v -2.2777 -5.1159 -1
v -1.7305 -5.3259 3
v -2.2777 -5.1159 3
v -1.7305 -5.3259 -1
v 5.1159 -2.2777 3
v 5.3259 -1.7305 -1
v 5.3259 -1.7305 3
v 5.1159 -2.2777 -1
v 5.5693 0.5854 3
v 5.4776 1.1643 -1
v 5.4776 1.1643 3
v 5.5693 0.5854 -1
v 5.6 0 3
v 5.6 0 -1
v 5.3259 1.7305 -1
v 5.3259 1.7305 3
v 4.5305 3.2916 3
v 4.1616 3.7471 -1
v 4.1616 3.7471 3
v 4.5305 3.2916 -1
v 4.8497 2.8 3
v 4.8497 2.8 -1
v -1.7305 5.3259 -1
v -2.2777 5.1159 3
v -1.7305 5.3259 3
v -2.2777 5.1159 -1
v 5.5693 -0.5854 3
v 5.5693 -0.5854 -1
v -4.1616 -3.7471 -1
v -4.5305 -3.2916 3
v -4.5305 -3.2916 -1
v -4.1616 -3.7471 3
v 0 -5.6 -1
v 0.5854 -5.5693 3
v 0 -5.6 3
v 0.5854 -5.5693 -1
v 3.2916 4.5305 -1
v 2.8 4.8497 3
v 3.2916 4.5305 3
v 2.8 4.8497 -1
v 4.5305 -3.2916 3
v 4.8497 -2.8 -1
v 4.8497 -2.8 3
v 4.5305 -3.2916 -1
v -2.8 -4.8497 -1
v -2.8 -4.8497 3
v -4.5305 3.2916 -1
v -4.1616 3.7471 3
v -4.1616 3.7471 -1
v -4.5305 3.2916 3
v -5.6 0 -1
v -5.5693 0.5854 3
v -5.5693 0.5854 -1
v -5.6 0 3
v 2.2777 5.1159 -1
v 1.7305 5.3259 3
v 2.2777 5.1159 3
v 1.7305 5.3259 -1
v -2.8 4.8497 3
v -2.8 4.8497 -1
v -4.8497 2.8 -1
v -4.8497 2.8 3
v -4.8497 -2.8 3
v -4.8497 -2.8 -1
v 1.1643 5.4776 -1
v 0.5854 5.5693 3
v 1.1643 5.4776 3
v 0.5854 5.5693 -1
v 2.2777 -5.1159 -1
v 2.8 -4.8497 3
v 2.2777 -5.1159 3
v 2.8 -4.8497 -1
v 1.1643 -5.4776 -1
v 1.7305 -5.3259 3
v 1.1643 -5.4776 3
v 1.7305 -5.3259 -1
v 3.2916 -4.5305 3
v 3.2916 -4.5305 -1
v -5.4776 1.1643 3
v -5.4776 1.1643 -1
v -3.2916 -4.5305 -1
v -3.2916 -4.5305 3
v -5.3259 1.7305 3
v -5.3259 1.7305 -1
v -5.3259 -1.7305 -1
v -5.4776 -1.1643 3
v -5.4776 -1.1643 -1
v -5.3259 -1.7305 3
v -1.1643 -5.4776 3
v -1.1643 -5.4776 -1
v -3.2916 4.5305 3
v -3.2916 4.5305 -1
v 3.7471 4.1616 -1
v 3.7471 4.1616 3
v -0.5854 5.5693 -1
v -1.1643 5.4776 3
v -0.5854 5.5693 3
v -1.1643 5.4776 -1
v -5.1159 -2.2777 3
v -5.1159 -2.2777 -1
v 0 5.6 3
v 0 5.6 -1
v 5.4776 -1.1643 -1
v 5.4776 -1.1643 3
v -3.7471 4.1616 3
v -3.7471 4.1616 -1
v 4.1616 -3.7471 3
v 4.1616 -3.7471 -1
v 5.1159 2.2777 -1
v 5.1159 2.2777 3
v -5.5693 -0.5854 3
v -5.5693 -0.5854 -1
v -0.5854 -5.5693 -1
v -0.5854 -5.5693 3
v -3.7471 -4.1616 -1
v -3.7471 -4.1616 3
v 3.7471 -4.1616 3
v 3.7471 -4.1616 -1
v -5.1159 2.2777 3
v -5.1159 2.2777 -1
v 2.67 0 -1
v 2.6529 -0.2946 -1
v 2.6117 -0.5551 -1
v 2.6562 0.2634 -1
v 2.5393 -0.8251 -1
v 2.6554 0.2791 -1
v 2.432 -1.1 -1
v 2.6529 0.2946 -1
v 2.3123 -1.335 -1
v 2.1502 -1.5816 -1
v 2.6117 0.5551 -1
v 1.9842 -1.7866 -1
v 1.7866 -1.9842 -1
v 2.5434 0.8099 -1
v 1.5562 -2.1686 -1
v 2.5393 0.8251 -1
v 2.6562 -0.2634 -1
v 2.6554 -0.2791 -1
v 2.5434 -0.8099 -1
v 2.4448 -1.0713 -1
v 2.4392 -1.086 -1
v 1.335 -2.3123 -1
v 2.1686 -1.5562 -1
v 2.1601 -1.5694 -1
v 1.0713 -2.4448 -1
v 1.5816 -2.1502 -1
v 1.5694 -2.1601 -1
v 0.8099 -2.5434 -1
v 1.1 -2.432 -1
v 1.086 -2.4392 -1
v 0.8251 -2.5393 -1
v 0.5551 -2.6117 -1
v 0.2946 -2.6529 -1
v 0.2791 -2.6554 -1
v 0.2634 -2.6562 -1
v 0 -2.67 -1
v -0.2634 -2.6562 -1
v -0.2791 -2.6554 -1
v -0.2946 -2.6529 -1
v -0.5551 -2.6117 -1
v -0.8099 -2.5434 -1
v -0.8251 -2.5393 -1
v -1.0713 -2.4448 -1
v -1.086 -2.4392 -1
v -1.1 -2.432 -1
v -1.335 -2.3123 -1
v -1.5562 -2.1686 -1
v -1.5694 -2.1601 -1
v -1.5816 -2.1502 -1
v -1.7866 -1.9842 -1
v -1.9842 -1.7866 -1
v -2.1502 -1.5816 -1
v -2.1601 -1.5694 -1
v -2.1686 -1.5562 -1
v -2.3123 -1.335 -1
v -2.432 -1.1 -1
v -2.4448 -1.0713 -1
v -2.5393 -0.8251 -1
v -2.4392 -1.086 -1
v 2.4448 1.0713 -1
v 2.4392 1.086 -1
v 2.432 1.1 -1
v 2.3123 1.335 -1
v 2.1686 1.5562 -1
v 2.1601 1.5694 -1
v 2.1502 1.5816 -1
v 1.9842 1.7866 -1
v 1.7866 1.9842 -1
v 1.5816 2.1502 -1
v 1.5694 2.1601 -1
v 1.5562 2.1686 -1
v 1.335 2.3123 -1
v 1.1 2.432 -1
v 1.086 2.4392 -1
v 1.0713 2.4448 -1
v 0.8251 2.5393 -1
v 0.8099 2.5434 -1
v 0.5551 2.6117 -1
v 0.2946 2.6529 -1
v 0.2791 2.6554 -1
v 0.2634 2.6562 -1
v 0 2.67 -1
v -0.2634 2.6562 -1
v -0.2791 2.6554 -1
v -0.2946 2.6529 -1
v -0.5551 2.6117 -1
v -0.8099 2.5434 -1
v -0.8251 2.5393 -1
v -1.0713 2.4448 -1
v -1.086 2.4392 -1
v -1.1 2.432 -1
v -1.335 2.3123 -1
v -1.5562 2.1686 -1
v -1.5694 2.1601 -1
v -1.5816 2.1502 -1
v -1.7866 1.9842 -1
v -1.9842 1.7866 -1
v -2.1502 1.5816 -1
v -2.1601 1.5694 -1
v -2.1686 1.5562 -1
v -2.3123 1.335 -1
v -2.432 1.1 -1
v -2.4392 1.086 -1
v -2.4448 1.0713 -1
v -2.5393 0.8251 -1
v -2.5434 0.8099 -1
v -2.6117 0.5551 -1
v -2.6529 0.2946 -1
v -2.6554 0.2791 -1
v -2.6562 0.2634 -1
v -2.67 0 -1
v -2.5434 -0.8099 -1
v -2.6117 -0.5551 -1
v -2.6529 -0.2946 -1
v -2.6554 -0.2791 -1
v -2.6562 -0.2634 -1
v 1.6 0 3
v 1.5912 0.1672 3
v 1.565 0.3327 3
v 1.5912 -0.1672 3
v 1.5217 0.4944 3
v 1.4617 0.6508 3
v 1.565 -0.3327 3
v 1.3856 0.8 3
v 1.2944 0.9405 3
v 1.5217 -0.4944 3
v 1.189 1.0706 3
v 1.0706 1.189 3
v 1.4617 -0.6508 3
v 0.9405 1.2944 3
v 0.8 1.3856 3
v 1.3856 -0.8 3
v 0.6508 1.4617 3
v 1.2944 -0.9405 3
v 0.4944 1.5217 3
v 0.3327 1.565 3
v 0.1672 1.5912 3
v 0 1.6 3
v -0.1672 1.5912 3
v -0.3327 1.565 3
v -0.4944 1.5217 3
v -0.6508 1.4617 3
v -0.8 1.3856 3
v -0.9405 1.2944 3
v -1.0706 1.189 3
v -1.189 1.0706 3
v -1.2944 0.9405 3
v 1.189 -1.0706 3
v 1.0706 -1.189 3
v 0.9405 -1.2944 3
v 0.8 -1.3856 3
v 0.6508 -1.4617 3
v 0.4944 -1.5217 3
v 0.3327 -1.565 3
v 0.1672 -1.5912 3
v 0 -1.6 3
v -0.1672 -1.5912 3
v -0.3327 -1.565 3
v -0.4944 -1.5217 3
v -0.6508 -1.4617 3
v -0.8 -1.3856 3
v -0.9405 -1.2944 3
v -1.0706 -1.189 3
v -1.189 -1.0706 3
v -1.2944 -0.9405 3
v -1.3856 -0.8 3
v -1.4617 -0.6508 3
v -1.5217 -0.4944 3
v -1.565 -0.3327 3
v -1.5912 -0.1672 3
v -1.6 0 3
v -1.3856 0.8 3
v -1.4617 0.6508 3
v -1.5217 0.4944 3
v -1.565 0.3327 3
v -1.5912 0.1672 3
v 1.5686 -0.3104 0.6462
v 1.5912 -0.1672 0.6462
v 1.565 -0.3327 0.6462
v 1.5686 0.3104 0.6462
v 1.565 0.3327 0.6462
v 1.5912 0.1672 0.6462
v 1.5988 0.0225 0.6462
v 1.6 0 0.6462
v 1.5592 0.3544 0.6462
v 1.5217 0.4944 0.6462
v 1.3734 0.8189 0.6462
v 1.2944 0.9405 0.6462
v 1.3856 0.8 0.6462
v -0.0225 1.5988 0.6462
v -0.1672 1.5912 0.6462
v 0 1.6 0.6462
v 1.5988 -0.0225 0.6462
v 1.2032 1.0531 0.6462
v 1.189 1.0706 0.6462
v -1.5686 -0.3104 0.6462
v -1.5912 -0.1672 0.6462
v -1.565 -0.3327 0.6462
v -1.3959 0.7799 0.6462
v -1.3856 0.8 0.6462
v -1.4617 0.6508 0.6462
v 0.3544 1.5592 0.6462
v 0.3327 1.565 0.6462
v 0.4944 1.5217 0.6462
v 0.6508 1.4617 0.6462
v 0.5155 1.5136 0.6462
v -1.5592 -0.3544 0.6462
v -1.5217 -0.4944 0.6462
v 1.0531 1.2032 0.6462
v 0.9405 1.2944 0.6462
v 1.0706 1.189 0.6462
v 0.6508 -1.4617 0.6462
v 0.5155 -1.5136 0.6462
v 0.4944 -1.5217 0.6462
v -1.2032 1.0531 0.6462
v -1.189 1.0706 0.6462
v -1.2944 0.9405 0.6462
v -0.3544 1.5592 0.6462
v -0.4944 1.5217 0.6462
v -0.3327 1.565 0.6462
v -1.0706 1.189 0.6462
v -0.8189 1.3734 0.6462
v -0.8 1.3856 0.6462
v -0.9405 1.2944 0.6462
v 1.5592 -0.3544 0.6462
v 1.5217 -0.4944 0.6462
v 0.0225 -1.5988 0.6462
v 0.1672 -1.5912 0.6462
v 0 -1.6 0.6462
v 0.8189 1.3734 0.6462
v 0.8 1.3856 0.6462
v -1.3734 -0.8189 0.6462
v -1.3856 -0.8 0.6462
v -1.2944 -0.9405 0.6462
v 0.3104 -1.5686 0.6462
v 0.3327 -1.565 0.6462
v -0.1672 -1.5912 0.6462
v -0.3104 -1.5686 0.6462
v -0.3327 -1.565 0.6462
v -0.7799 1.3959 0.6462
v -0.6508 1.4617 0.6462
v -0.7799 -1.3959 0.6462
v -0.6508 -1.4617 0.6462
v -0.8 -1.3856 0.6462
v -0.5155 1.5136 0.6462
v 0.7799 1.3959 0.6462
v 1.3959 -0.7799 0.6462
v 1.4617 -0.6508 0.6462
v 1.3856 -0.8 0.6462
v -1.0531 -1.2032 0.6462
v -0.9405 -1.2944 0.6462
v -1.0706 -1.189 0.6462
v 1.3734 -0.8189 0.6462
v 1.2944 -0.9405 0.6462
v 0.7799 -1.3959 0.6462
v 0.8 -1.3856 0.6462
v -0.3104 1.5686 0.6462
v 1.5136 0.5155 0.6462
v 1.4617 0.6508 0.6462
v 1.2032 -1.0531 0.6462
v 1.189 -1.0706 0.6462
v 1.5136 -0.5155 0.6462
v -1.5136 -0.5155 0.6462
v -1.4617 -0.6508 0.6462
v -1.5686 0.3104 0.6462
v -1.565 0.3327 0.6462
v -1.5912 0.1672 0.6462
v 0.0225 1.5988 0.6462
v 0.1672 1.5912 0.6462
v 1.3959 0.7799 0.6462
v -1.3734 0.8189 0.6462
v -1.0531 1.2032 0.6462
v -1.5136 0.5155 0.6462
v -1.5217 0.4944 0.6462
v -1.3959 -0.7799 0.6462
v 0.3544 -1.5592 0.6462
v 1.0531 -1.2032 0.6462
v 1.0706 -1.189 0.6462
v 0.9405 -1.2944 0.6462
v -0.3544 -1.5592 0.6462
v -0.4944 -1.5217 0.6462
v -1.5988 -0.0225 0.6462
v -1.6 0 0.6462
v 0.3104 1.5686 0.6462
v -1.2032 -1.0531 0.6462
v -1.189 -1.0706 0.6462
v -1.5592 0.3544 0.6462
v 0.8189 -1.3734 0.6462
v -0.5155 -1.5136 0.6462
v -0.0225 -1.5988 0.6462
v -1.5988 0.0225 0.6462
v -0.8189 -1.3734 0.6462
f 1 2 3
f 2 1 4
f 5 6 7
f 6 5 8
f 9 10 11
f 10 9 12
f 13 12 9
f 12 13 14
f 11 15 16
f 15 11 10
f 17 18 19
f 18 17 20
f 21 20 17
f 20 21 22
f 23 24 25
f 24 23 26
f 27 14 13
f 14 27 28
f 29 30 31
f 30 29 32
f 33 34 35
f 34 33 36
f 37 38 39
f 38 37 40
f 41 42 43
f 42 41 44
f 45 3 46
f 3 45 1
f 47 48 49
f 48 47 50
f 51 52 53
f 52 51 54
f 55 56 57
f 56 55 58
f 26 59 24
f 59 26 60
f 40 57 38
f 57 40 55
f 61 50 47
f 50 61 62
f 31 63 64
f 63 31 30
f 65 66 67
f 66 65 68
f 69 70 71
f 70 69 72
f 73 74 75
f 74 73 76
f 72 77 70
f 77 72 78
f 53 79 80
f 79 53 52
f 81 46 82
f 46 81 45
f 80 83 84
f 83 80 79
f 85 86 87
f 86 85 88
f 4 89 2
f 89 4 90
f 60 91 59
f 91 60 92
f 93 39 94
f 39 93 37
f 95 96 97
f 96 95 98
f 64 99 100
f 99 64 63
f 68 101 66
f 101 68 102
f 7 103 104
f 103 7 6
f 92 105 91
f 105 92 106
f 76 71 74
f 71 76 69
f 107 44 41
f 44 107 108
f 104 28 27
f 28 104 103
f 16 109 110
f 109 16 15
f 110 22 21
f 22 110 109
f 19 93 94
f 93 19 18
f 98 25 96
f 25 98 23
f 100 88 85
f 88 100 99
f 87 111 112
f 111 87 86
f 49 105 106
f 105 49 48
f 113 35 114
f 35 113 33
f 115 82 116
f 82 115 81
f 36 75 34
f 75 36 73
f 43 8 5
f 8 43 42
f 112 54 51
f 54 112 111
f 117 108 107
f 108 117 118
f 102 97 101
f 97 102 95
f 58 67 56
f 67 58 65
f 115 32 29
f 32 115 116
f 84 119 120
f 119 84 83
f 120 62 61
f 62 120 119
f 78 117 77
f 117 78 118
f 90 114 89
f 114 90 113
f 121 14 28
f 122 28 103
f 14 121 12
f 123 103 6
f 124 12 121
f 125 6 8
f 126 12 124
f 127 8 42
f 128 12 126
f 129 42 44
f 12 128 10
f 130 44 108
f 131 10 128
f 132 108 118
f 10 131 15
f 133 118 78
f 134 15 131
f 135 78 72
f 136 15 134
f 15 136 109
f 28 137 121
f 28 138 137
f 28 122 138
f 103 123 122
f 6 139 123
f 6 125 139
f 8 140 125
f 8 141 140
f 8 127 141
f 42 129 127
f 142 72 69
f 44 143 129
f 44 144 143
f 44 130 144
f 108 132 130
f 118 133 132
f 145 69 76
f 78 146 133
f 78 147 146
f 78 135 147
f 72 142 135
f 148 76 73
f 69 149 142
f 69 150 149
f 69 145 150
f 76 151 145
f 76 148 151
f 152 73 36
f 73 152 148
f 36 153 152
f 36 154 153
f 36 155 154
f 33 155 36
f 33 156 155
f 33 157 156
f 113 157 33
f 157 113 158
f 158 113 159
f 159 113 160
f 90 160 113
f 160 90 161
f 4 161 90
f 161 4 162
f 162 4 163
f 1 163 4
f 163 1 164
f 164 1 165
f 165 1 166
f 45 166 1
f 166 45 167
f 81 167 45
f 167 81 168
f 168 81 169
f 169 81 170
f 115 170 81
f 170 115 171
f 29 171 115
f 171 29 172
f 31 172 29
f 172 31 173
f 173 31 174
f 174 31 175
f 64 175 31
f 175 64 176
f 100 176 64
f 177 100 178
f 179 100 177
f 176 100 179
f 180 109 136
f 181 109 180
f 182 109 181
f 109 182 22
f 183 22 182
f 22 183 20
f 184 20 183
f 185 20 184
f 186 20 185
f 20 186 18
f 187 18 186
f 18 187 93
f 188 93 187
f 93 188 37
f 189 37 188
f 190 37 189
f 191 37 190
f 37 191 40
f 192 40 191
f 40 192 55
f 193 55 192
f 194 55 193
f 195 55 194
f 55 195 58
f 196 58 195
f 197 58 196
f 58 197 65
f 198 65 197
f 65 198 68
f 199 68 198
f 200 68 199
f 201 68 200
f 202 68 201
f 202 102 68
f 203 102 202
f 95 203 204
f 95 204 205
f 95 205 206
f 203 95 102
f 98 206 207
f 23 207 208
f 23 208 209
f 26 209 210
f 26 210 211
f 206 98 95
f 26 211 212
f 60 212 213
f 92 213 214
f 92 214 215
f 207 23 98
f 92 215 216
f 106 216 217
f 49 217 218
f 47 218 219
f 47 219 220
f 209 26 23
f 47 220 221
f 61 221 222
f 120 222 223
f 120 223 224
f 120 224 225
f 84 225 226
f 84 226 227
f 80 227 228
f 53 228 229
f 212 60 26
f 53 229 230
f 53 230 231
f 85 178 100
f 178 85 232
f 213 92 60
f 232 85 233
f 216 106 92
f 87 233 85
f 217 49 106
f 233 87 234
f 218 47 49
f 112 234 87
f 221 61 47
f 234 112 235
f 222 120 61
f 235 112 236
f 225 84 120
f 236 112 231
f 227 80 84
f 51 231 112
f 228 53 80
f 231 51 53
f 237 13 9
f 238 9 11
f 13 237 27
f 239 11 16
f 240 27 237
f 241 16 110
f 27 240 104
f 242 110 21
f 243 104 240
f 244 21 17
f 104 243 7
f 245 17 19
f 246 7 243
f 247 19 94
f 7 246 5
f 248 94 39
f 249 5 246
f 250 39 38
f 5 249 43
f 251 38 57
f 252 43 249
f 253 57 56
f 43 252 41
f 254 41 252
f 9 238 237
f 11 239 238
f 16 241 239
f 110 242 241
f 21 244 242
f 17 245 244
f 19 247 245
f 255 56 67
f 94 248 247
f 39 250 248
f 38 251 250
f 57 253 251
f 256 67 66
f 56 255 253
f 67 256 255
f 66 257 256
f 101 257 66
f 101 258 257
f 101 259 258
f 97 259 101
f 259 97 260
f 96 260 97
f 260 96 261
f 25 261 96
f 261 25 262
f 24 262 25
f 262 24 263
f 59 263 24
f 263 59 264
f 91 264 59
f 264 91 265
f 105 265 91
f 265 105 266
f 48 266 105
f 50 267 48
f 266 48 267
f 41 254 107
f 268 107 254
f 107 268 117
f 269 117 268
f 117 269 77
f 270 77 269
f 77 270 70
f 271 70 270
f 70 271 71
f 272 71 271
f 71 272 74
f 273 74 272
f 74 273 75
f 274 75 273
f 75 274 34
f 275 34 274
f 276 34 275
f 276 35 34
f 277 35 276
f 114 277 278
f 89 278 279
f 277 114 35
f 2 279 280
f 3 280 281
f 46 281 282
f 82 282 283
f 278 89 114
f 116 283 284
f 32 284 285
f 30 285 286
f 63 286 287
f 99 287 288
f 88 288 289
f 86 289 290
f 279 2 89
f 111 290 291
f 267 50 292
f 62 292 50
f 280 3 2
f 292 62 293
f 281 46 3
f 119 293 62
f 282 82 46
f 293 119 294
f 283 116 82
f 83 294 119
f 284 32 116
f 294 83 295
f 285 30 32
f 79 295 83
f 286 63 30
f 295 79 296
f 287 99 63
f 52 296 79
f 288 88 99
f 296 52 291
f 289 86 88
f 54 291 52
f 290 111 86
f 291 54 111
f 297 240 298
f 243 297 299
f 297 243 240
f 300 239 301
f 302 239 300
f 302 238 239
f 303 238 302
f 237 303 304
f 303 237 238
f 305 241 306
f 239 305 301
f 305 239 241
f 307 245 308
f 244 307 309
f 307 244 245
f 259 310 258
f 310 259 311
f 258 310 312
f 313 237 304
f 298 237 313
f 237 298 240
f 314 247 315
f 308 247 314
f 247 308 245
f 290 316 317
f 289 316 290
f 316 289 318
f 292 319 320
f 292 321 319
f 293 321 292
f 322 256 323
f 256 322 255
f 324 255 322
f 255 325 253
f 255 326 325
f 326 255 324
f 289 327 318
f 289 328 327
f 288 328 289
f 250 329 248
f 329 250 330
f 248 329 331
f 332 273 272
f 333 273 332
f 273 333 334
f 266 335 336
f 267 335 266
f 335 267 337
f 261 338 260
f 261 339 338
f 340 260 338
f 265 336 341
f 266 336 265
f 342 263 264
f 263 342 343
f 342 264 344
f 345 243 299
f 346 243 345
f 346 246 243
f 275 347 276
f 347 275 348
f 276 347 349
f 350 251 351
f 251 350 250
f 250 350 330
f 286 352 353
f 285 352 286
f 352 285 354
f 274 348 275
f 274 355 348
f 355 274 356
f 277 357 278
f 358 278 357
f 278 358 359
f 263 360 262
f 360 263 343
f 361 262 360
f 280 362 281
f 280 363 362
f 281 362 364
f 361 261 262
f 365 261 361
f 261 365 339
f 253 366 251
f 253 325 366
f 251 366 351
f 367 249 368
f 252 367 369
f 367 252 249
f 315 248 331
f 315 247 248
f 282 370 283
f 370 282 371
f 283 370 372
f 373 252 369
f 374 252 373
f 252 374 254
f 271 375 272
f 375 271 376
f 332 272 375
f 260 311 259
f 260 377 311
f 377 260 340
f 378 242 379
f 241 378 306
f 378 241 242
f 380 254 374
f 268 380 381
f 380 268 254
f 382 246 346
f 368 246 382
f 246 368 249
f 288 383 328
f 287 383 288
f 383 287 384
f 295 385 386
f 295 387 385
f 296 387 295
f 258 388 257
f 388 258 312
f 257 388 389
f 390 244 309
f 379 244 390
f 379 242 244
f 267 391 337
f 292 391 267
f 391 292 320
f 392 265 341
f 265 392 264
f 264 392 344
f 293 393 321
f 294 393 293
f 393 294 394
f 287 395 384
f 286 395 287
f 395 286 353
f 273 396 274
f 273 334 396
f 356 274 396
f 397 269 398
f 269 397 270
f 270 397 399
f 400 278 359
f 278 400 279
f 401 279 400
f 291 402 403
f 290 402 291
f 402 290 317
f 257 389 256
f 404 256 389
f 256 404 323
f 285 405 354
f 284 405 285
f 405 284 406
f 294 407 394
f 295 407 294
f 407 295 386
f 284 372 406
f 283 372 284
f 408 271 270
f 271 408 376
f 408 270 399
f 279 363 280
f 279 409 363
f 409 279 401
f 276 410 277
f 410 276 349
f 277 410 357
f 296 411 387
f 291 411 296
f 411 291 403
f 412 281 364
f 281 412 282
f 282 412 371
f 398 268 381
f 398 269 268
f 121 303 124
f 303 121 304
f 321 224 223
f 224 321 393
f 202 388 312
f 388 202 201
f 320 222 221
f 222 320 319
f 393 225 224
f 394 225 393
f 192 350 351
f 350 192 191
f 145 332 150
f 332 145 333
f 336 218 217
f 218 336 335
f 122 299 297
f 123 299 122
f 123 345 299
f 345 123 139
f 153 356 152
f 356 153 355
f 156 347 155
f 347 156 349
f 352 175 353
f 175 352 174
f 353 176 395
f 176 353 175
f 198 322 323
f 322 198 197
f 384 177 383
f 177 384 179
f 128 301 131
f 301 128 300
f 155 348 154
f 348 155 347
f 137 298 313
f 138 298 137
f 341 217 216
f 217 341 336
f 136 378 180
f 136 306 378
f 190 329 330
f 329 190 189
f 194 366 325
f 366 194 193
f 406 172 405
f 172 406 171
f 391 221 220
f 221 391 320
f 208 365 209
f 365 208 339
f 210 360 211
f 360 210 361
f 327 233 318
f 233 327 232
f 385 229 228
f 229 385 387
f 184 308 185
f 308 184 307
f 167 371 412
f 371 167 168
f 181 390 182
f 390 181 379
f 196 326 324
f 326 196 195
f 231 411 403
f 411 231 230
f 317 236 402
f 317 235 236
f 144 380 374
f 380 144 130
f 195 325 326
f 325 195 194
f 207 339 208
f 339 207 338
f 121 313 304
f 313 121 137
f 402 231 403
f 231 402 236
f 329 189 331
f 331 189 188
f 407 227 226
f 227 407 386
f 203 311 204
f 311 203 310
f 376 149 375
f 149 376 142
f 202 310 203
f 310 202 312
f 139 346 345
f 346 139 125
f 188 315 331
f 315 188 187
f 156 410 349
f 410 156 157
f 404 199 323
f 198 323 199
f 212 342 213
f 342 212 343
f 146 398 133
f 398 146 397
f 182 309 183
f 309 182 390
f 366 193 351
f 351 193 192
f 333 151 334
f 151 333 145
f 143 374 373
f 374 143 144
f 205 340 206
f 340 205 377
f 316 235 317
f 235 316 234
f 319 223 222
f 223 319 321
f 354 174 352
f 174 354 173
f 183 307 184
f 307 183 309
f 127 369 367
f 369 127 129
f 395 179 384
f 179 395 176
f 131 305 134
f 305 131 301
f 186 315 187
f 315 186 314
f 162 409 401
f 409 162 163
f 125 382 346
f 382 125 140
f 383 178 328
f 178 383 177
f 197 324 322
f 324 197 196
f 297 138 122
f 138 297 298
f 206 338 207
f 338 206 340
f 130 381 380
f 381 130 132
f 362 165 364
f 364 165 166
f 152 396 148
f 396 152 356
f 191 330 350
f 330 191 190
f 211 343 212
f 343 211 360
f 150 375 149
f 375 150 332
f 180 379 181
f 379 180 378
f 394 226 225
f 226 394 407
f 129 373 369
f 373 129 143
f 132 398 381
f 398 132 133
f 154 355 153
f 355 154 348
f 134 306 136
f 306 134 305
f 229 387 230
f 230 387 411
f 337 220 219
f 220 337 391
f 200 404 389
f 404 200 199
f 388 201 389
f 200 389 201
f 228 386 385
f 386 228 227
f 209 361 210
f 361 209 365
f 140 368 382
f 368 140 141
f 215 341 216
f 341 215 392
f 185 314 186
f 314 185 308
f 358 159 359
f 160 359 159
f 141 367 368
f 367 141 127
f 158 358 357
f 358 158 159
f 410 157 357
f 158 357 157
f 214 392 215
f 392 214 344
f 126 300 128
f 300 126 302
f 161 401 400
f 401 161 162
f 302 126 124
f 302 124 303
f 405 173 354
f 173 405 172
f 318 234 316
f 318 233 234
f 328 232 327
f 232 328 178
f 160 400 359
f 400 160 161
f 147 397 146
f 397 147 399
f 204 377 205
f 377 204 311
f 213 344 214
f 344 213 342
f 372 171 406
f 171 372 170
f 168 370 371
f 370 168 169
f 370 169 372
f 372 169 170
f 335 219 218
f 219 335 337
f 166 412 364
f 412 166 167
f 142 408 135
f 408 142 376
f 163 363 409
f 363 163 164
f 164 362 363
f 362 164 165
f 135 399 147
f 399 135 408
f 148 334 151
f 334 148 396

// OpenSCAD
$fn=60;

difference(){
    translate( [0, 0, -1])
cylinder(  h=4, r1=5.6,  r2=5.6);
translate( [0, 0, -10])
cylinder(  h=13.8, r1=1.6,  r2=1.6);
     translate( [0, 0, -1.2])
cylinder(  h=2, r1=2.8,  r2=1.5);   

}
